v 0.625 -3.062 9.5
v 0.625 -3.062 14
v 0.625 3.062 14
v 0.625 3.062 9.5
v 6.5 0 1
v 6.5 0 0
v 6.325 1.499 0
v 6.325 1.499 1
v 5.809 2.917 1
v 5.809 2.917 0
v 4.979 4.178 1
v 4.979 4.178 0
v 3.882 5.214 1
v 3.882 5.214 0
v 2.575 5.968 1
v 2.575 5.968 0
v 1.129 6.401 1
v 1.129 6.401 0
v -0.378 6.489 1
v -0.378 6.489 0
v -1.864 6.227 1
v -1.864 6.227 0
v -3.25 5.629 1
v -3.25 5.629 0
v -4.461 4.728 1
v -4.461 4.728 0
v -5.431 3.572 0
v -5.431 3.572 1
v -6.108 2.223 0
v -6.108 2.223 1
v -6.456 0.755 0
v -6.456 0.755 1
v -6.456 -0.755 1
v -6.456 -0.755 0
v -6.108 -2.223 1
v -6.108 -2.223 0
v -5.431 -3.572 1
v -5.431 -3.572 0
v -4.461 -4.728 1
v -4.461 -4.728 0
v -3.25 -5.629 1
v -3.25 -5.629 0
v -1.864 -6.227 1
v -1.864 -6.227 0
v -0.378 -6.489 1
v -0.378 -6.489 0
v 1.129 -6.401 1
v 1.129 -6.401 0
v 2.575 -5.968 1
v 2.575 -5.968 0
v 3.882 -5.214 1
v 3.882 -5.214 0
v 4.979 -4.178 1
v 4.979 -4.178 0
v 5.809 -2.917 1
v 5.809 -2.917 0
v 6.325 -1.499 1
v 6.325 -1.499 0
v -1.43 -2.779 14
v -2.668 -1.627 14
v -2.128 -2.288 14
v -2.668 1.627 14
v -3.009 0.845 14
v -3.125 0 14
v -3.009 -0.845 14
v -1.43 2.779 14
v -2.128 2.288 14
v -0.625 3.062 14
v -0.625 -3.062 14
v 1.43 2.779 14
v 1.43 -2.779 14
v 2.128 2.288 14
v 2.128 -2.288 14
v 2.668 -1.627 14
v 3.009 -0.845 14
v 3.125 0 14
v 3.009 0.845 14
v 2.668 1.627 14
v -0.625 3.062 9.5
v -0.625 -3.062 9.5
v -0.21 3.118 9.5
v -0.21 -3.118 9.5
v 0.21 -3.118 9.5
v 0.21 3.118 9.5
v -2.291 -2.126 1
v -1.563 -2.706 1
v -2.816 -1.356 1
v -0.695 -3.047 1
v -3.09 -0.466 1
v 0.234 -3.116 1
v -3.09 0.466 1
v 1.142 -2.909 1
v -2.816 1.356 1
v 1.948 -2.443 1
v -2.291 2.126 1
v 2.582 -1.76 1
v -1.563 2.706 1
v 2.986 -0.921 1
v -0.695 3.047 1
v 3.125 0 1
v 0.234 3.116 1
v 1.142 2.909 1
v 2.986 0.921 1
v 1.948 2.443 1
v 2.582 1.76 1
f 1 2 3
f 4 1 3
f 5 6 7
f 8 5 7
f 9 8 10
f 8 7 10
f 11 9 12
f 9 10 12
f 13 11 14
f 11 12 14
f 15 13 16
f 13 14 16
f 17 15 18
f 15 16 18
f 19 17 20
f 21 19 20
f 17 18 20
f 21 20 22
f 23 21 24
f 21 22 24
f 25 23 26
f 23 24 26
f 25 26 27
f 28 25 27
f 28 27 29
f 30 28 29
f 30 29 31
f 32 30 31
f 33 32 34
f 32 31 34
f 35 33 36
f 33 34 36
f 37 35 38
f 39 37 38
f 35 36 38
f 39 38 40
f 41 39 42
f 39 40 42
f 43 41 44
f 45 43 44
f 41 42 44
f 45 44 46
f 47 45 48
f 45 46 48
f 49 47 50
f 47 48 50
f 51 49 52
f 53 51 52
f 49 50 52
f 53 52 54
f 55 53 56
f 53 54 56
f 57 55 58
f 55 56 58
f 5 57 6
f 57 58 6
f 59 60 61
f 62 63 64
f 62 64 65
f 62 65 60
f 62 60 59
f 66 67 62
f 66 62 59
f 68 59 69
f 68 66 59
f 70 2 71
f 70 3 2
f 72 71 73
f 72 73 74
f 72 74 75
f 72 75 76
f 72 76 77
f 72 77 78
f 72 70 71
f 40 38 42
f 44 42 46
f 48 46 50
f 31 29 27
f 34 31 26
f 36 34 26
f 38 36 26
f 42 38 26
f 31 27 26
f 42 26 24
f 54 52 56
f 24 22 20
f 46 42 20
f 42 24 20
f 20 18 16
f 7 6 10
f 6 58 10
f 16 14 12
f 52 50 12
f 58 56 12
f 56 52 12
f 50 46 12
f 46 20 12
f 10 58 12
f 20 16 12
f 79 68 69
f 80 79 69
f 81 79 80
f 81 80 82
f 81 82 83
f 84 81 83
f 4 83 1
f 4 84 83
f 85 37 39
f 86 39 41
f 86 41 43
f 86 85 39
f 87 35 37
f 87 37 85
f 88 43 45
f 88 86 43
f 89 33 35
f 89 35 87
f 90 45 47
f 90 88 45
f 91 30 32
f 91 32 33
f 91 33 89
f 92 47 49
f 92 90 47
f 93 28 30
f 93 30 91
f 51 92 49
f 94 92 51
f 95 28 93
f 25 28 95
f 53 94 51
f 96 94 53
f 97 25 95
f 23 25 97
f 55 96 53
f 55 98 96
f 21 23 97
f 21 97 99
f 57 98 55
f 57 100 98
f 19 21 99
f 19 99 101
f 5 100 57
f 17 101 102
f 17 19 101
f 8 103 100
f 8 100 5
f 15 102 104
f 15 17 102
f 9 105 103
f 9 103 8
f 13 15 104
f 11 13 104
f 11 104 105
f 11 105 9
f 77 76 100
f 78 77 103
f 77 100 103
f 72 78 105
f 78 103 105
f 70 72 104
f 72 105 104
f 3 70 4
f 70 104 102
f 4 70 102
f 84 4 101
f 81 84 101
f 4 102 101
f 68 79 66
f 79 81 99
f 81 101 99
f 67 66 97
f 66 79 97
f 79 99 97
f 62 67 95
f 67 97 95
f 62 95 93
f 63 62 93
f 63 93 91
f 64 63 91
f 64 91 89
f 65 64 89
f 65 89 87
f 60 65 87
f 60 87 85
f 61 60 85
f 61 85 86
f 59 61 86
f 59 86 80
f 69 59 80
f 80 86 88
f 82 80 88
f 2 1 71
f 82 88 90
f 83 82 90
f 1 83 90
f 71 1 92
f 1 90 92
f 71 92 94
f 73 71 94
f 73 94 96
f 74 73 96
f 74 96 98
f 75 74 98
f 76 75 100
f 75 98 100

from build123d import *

# Parameters (mm, degrees)
F0_R     = 3.125
F1_DEPTH = 14
F0_R_2   = 6.5
F2_DEPTH = 1
F4_DEPTH = 4.5


with BuildPart() as f1:
    # F0 (on Top) → F1 (new body)
    with BuildSketch(Plane.XY):
        Circle(F0_R)
    extrude(amount=F1_DEPTH)

    # F0 (on Top) → F2 (join)
    with BuildSketch(Plane.XY):
        Circle(F0_R_2)
        Circle(F0_R, mode=Mode.SUBTRACT)
    extrude(amount=F2_DEPTH)

    # F3 (on face) → F4 (cut)
    with BuildSketch(Plane.XY.offset(14)):
        with BuildLine():
            Line((0.625, -3.0618621785), (0.625, 3.0618621785))
            ThreePointArc((0.625, 3.0618621785), (0, 3.125), (-0.625, 3.0618621785))
            Line((-0.625, 3.0618621785), (-0.625, -3.0618621785))
            ThreePointArc((-0.625, -3.0618621785), (0, -3.125), (0.625, -3.0618621785))
        make_face()
    extrude(amount=-F4_DEPTH, mode=Mode.SUBTRACT)


solid = f1.part
